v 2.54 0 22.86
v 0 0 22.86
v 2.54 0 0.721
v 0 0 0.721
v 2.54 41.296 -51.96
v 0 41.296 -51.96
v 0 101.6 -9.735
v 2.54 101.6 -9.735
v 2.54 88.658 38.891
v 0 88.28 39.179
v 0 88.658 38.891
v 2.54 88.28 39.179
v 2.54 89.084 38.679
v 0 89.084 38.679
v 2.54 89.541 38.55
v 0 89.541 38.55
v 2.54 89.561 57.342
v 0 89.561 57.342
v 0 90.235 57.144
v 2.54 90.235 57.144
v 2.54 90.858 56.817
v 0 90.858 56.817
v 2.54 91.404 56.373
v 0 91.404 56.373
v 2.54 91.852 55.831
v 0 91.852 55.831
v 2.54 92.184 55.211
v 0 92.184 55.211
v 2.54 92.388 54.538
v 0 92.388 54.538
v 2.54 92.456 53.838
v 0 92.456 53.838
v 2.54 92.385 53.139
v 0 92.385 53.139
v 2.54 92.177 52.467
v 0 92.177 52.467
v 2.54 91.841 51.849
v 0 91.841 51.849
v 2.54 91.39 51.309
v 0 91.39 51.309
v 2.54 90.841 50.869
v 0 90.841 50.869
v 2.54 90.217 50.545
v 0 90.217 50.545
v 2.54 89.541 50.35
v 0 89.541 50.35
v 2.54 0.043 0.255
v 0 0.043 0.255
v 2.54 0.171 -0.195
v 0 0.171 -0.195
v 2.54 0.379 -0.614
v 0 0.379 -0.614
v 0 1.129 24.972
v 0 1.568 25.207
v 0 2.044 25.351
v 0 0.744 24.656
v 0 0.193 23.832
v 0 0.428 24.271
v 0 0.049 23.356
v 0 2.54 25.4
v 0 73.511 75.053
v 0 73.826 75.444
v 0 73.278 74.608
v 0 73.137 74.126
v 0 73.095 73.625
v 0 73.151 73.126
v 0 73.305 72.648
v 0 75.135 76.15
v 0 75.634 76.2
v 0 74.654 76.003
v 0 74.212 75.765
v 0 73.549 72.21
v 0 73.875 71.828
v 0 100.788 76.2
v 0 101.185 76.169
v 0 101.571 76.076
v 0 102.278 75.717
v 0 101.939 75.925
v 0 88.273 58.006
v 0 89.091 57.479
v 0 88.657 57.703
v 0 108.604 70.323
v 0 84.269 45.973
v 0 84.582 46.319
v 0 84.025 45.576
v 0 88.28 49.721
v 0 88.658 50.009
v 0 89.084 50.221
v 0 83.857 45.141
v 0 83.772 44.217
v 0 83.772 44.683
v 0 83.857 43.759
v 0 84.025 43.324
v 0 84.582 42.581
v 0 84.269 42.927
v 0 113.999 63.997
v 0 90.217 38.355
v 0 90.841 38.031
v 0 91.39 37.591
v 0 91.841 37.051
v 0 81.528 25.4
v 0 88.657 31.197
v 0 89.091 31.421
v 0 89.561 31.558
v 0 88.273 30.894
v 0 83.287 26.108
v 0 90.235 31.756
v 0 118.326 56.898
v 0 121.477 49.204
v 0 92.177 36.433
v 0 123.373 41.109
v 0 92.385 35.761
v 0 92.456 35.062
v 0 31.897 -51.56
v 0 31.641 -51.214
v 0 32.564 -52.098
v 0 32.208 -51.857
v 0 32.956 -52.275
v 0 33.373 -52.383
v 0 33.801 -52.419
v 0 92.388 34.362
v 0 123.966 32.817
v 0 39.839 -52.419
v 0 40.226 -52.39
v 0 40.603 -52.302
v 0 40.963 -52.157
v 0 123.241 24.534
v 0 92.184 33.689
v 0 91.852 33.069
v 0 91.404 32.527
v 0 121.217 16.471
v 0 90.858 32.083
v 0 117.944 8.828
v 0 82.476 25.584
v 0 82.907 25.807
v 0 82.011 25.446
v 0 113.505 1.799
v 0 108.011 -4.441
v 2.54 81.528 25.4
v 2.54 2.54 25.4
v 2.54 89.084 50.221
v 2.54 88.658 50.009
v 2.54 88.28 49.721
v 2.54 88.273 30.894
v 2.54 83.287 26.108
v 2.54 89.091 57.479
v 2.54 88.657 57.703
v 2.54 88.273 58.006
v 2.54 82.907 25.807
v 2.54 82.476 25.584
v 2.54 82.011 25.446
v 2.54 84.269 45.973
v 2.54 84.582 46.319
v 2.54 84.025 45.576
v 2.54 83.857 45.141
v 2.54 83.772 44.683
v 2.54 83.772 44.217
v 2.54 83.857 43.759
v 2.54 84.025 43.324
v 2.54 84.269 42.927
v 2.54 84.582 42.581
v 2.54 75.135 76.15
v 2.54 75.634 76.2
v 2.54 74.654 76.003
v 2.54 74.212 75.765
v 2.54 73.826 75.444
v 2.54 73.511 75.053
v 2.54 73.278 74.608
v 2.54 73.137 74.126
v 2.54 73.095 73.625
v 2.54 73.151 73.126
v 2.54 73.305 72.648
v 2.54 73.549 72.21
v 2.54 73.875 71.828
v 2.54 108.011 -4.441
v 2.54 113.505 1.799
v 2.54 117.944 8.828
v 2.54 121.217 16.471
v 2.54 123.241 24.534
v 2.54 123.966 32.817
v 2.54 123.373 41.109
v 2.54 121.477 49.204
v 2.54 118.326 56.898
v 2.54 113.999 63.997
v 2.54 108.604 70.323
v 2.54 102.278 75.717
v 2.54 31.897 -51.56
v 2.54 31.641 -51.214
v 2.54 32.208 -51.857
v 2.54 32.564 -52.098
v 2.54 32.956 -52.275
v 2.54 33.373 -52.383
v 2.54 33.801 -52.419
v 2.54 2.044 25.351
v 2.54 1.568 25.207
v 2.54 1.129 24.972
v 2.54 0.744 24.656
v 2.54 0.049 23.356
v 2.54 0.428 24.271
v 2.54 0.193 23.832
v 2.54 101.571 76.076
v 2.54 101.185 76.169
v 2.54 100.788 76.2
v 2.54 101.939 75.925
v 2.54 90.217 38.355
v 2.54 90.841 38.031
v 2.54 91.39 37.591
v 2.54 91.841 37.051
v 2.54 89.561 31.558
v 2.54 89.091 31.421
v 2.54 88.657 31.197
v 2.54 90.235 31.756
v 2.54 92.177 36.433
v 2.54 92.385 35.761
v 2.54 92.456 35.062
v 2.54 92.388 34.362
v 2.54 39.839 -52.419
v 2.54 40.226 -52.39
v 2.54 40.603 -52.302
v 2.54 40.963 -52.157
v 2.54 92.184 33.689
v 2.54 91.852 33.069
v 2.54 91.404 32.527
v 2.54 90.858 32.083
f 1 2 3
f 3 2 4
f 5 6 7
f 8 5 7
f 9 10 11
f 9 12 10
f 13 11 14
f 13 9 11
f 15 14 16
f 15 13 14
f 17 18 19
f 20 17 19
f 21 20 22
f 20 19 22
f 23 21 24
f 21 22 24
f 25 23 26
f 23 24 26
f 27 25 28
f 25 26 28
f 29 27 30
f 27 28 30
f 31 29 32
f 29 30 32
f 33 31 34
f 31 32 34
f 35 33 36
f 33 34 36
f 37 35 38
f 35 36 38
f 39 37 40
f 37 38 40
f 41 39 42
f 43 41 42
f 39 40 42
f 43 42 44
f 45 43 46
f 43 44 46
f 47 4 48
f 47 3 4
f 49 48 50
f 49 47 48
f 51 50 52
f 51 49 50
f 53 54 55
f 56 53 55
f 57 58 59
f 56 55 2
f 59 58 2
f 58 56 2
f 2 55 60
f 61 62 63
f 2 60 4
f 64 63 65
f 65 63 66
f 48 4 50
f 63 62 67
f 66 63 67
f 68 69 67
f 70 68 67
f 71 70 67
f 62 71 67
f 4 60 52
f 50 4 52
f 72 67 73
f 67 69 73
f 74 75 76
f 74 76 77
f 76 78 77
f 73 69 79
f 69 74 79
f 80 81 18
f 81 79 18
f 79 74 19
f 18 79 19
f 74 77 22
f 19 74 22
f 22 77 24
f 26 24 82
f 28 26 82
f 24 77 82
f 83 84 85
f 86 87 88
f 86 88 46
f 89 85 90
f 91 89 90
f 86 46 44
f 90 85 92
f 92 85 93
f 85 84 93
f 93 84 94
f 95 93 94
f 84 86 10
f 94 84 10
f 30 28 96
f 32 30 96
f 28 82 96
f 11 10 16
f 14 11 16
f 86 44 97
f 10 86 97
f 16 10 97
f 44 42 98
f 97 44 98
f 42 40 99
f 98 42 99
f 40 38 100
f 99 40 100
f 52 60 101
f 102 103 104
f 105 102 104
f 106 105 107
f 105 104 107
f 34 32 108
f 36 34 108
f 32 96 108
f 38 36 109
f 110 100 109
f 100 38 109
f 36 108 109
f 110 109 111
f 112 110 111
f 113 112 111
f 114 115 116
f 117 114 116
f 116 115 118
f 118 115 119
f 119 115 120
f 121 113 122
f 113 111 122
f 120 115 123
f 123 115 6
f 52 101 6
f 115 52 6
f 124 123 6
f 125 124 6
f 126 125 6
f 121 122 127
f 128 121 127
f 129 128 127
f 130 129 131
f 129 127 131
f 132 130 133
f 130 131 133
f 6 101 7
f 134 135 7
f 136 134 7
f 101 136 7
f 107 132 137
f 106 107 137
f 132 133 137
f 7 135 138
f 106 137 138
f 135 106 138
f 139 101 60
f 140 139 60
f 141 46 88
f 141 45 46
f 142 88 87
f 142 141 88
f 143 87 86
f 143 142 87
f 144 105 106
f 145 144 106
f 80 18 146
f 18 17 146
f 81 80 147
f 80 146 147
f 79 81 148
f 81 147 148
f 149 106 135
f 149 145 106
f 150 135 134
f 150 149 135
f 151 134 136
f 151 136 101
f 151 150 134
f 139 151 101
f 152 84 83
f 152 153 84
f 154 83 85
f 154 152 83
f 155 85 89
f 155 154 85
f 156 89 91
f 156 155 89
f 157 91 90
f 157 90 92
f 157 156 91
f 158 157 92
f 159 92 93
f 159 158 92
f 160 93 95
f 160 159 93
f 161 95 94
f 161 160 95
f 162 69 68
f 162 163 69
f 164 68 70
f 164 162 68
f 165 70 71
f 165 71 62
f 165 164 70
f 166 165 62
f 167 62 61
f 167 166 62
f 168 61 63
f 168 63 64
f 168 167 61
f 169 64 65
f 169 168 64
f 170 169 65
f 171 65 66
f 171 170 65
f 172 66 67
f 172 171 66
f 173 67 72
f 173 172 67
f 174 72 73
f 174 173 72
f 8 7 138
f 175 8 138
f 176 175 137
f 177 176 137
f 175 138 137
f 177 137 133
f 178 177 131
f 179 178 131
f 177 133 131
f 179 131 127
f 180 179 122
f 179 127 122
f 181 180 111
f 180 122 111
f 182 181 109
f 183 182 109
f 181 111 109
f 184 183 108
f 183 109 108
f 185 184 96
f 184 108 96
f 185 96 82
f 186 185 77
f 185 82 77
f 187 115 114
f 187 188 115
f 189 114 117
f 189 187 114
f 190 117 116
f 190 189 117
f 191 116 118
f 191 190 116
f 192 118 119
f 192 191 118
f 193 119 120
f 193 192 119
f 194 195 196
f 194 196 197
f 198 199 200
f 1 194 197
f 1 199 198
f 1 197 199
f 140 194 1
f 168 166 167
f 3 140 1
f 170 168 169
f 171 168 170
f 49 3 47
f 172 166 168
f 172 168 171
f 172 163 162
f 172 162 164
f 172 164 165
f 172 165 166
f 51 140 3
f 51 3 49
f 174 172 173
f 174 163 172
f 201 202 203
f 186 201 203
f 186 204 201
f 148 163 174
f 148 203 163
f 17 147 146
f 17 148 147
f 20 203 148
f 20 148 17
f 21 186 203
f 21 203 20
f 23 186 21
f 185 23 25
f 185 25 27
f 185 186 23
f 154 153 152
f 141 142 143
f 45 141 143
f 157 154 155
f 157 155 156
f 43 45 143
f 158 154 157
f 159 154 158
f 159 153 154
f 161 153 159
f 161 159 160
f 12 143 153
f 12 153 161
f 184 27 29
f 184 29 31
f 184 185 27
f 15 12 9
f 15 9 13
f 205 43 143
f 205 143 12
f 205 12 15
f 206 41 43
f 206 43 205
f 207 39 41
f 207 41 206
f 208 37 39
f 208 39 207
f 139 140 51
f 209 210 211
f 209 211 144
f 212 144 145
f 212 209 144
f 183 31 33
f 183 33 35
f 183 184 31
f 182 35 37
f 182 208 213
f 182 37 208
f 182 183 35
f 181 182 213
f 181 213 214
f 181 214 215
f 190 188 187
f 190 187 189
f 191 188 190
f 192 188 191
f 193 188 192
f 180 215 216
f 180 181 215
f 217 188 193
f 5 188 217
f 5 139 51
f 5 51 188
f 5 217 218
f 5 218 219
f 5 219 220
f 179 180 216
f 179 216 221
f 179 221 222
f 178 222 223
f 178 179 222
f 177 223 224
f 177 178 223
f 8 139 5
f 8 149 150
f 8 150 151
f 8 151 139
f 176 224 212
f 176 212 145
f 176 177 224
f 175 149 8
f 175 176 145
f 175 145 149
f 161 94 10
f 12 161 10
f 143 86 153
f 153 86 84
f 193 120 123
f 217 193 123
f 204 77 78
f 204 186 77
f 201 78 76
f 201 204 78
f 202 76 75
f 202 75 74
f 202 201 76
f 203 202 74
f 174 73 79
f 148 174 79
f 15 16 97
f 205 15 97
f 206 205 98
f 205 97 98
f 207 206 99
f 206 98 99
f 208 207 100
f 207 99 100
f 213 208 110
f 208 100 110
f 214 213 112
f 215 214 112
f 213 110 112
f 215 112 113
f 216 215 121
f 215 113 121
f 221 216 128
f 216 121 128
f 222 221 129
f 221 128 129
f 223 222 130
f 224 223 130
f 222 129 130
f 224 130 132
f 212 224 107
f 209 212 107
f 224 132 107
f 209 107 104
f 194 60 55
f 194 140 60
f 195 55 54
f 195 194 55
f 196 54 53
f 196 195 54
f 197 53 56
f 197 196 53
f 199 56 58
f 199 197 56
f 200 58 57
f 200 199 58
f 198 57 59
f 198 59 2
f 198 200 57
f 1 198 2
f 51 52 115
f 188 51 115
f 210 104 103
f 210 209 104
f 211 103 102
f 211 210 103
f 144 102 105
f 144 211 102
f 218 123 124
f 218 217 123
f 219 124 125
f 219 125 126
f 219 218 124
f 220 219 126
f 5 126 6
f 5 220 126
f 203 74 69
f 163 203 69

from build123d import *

# Parameters (mm, degrees)
BOSS_EXTRUDE1_DEPTH = 2.54
FILLET1_R           = 2.54


with BuildPart() as part:
    # Sketch1 → Boss-Extrude1 (new body)
    with BuildSketch(Plane(origin=(0, 0, 0), x_dir=(0, 0, -1), z_dir=(1, 0, 0))):
        with BuildLine():
            ThreePointArc((-57.404, 88.9), (-53.848, 92.456), (-50.292, 88.9))
            Line((-50.292, 88.9), (-44.45, 82.55))
            Line((-44.45, 82.55), (-38.608, 88.9))
            ThreePointArc((-38.608, 88.9), (-35.052, 92.456), (-31.496, 88.9))
            Line((-31.496, 88.9), (-25.4, 82.55))
            Line((-25.4, 82.55), (-25.4, 0))
            Line((-25.4, 0), (0, 0))
            Line((0, 0), (52.41925, 32.385))
            Line((52.41925, 32.385), (52.41925, 40.64))
            Line((52.41925, 40.64), (9.734598471, 101.6))
            ThreePointArc((9.734598471, 101.6), (-33.232700765, 123.967360233), (-76.2, 101.6))
            Line((-76.2, 101.6), (-76.2, 69.320833333))
            Line((-76.2, 69.320833333), (-57.404, 88.9))
        make_face()
    extrude(amount=BOSS_EXTRUDE1_DEPTH)

    # Fillet1
    fillet1_edges = [part.edges().sort_by_distance(p)[0] for p in [
        (1.27, 40.64, -52.41925),
        (1.27, 32.385, -52.41925),
        (1.27, 0, 0),
        (1.27, 0, 25.4),
        (1.27, 82.55, 25.4),
        (1.27, 88.9, 31.496),
        (1.27, 88.9, 38.608),
        (1.27, 82.55, 44.45),
        (1.27, 88.9, 50.292),
        (1.27, 88.9, 57.404),
        (1.27, 69.320833333, 76.2),
        (1.27, 101.6, 76.2),
    ]]
    fillet(fillet1_edges, radius=FILLET1_R)


solid = part.part
